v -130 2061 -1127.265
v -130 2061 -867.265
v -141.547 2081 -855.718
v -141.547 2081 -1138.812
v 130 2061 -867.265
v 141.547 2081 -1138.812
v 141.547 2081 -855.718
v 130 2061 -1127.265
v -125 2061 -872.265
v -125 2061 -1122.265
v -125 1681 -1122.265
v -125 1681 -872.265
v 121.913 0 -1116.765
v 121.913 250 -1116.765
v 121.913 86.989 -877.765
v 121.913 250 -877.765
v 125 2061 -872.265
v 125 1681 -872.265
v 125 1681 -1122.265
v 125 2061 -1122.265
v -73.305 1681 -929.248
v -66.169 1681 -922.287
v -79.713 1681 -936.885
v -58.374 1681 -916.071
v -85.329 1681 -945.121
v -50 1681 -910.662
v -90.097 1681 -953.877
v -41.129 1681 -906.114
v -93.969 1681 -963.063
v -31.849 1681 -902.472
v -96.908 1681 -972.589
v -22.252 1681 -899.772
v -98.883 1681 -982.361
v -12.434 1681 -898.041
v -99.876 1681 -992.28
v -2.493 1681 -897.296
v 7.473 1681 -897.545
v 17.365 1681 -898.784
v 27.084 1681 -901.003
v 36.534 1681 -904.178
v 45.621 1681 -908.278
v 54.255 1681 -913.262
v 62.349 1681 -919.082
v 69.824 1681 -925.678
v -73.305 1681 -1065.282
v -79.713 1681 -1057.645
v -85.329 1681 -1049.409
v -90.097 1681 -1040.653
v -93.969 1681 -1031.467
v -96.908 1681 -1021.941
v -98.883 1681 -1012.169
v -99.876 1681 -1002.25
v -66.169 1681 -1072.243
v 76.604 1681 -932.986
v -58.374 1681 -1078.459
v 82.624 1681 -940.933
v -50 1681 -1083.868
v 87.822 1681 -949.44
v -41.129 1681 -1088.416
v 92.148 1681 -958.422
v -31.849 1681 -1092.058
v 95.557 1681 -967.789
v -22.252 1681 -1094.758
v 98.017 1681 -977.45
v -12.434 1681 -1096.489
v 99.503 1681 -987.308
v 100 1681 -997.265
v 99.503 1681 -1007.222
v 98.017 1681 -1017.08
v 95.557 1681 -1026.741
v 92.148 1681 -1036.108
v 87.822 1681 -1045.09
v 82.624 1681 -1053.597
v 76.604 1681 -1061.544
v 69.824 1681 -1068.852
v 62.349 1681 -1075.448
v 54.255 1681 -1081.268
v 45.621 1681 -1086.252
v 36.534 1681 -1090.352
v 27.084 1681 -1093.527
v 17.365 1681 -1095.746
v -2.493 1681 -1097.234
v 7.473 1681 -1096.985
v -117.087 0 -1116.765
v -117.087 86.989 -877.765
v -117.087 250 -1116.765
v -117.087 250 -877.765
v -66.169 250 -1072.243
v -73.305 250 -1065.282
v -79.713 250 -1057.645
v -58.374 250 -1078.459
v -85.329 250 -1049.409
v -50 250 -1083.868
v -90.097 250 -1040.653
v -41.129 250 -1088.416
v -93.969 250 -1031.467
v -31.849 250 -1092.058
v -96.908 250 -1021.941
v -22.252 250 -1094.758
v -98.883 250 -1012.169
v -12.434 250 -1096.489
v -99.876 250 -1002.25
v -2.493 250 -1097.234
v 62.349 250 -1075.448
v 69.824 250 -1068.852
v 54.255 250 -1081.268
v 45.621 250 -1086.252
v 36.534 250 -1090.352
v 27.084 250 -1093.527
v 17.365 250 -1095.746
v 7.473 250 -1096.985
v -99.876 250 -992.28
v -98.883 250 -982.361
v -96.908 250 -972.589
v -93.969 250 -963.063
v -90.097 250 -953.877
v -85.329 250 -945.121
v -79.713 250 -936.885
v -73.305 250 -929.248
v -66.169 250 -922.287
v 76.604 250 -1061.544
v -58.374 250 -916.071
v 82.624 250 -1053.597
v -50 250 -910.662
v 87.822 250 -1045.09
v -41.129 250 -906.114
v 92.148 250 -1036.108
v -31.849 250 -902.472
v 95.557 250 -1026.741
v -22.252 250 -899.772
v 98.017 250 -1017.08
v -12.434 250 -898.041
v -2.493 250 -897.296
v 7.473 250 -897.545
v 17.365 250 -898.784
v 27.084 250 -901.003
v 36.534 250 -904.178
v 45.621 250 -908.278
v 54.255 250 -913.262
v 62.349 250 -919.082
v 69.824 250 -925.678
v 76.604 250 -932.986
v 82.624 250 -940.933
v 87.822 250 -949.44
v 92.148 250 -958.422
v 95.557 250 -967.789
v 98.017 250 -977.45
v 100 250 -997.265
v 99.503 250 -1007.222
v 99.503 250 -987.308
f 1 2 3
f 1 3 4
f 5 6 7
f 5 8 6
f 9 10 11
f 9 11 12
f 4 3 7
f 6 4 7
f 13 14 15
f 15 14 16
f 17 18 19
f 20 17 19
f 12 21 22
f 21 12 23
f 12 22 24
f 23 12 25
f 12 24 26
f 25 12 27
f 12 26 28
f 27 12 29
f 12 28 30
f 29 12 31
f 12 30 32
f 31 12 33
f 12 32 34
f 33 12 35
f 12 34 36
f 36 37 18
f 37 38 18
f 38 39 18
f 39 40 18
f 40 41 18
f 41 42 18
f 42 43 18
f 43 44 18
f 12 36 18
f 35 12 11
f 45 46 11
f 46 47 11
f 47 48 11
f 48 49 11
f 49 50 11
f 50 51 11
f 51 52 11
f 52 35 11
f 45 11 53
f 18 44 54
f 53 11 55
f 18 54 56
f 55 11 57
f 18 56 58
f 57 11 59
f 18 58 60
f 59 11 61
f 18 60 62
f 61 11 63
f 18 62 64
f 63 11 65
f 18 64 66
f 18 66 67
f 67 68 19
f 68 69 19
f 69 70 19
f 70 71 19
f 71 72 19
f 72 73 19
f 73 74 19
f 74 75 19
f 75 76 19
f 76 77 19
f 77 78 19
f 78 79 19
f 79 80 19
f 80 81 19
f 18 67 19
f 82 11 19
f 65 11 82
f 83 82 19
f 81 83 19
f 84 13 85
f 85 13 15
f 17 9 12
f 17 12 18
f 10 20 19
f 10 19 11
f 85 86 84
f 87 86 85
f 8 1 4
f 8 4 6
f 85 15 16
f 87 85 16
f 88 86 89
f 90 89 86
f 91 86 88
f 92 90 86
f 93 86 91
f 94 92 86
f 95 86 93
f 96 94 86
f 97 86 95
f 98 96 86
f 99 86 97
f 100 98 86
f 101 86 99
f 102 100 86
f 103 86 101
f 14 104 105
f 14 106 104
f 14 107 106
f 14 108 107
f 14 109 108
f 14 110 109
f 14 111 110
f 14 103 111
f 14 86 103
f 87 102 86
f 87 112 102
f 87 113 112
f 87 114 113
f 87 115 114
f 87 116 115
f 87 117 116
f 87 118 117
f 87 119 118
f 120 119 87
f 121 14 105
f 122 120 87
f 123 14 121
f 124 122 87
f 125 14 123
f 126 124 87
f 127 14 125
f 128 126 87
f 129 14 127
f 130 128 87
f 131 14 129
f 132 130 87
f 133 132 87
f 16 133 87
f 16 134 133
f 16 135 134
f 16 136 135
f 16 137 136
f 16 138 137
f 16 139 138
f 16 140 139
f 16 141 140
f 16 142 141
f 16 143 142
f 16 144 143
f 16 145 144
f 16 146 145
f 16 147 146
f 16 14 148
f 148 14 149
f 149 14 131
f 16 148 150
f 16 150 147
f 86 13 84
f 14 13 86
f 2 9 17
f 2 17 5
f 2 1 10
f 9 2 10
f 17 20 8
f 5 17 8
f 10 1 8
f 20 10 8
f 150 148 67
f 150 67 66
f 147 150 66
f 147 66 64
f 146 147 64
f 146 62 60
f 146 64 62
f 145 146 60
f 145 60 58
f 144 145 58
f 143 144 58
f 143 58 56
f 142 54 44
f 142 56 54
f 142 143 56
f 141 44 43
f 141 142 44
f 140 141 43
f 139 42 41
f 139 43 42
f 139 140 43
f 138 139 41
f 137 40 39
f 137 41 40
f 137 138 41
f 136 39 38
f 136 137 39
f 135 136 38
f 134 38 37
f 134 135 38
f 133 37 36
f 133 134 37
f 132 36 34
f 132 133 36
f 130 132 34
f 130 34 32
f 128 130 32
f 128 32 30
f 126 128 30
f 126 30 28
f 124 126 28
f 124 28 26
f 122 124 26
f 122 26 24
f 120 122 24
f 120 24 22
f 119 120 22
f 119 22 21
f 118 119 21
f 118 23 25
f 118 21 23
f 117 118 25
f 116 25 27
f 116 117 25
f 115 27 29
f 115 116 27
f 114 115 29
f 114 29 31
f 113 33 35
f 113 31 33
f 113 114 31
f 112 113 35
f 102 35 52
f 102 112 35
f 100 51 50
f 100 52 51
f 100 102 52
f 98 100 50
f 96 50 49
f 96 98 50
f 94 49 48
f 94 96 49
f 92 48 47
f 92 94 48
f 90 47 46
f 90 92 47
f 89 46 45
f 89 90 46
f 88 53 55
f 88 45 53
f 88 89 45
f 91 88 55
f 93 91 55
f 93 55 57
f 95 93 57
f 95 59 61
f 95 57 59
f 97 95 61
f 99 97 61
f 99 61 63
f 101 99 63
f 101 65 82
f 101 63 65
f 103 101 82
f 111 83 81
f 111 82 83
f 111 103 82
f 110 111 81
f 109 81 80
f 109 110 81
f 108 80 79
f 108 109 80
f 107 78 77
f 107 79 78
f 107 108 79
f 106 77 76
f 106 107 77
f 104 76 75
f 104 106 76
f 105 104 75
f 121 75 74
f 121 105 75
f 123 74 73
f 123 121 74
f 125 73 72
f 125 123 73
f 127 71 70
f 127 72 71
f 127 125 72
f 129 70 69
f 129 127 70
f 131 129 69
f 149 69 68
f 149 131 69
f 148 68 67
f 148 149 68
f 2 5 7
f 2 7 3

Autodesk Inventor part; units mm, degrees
ref_plane "YZ Plane" through (0, 0, 0) normal (1, 0, 0) x (0, 1, 0)
ref_plane "XY Plane" through (0, 0, 0) normal (0, 0, 1) x (1, 0, 0)
sketch "Sketch1" plane through (0, 0, 0) normal (0, 1, 0) x (-1, 0, 0)
  line L0 (117.0873, -996.765) -> (117.0873, -877.765)
  line L1 (-121.9127, -877.765) -> (-121.9127, -996.765)
  line L2 (-121.9127, -1116.765) -> (-1.9127, -1116.765)
  line L3 (-2.9127, -1116.765) -> (117.0873, -1116.765)
  line L4 (117.0873, -996.765) -> (117.0873, -1116.765)
  line L5 (-121.9127, -996.765) -> (-121.9127, -1116.765)
  line L6 (117.0873, -1116.765) -> (-121.9127, -1116.765)
  line L7 (-121.9127, -1116.765) -> (-121.9127, -877.765)
  line L8 (-121.9127, -877.765) -> (117.0873, -877.765)
  line L9 (117.0873, -877.765) -> (117.0873, -1116.765)
  dimension "d0" = 239
ref_plane "Work Plane3" through (121.9127, 0, -1116.765) normal (-1, 0, 0) x (0, 0, 1)
ref_plane "Work Plane2" through (0, 0, 0) normal (0, 1, 0) x (-1, 0, 0)
sketch "Sketch2" plane through (121.9127, 0, -1116.765) normal (-1, 0, 0) x (0, 0, 1)
  line L0 (0, 0) -> (0, 3000)
  line L1 (239, 0) -> (239, 3000)
  line L2 (0, 0) -> (239, 86.9889)
  line L3 (0, 0) -> (254.3385, 0) construction
  line L4 (0, 0) -> (0, 250)
  line L5 (0, 250) -> (239, 250)
  line L6 (239, 250) -> (239, 86.9889)
  point P0 (1116.765, 0)
  dimension "d4" = 3000
  dimension "d5" = 3000
  dimension "d6" = 20
  dimension "d7" = 250
extrude "Extrusion1" add sketch "Sketch2" along normal blind 239
sketch "Sketch3" plane through (121.9127, 250, -877.765) normal (0, 1, 0) x (1, 0, 0)
  circle A0 centre (-121.9127, 119.5) radius 100
  point P0 (-121.9127, -877.765)
  dimension "d10" = 200
extrude "Extrusion2" add sketch "Sketch3" along normal blind 1431
sketch "Sketch4" plane through (0, 1681, -997.265) normal (0, 1, 0) x (1, 0, 0)
  line L0 (-125, -125) -> (125, -125)
  line L1 (125, -125) -> (125, 125)
  line L2 (125, 125) -> (-125, 125)
  line L3 (-125, 125) -> (-125, -125)
  line L4 (-125, -125) -> (125, 125) construction
  line L5 (125, -125) -> (-125, 125) construction
  point P0 (0, -997.265)
  point P1 (0, 0)
  point P2 (0, 0)
  point P3 (0, 0)
  dimension "d13" = 250
  dimension "d14" = 250
extrude "Extrusion3" add sketch "Sketch4" along normal blind 380
sketch "Sketch5" plane through (0, 2061, -997.265) normal (0, 1, 0) x (1, 0, 0)
  line L0 (130, -130) -> (-130, -130)
  line L1 (-130, -130) -> (-130, 130)
  line L2 (-130, 130) -> (130, 130)
  line L3 (130, 130) -> (130, -130)
  line L4 (130, -130) -> (-130, 130) construction
  line L5 (-130, -130) -> (130, 130) construction
  point P0 (0, -997.265)
  point P1 (0, 0)
  point P2 (0, 0)
  dimension "d17" = 260
  dimension "d18" = 260
extrude "Extrusion4" add sketch "Sketch5" along normal blind 20 draft 30
properties part number "side_pillar_01" material "Wood (Maple)"
